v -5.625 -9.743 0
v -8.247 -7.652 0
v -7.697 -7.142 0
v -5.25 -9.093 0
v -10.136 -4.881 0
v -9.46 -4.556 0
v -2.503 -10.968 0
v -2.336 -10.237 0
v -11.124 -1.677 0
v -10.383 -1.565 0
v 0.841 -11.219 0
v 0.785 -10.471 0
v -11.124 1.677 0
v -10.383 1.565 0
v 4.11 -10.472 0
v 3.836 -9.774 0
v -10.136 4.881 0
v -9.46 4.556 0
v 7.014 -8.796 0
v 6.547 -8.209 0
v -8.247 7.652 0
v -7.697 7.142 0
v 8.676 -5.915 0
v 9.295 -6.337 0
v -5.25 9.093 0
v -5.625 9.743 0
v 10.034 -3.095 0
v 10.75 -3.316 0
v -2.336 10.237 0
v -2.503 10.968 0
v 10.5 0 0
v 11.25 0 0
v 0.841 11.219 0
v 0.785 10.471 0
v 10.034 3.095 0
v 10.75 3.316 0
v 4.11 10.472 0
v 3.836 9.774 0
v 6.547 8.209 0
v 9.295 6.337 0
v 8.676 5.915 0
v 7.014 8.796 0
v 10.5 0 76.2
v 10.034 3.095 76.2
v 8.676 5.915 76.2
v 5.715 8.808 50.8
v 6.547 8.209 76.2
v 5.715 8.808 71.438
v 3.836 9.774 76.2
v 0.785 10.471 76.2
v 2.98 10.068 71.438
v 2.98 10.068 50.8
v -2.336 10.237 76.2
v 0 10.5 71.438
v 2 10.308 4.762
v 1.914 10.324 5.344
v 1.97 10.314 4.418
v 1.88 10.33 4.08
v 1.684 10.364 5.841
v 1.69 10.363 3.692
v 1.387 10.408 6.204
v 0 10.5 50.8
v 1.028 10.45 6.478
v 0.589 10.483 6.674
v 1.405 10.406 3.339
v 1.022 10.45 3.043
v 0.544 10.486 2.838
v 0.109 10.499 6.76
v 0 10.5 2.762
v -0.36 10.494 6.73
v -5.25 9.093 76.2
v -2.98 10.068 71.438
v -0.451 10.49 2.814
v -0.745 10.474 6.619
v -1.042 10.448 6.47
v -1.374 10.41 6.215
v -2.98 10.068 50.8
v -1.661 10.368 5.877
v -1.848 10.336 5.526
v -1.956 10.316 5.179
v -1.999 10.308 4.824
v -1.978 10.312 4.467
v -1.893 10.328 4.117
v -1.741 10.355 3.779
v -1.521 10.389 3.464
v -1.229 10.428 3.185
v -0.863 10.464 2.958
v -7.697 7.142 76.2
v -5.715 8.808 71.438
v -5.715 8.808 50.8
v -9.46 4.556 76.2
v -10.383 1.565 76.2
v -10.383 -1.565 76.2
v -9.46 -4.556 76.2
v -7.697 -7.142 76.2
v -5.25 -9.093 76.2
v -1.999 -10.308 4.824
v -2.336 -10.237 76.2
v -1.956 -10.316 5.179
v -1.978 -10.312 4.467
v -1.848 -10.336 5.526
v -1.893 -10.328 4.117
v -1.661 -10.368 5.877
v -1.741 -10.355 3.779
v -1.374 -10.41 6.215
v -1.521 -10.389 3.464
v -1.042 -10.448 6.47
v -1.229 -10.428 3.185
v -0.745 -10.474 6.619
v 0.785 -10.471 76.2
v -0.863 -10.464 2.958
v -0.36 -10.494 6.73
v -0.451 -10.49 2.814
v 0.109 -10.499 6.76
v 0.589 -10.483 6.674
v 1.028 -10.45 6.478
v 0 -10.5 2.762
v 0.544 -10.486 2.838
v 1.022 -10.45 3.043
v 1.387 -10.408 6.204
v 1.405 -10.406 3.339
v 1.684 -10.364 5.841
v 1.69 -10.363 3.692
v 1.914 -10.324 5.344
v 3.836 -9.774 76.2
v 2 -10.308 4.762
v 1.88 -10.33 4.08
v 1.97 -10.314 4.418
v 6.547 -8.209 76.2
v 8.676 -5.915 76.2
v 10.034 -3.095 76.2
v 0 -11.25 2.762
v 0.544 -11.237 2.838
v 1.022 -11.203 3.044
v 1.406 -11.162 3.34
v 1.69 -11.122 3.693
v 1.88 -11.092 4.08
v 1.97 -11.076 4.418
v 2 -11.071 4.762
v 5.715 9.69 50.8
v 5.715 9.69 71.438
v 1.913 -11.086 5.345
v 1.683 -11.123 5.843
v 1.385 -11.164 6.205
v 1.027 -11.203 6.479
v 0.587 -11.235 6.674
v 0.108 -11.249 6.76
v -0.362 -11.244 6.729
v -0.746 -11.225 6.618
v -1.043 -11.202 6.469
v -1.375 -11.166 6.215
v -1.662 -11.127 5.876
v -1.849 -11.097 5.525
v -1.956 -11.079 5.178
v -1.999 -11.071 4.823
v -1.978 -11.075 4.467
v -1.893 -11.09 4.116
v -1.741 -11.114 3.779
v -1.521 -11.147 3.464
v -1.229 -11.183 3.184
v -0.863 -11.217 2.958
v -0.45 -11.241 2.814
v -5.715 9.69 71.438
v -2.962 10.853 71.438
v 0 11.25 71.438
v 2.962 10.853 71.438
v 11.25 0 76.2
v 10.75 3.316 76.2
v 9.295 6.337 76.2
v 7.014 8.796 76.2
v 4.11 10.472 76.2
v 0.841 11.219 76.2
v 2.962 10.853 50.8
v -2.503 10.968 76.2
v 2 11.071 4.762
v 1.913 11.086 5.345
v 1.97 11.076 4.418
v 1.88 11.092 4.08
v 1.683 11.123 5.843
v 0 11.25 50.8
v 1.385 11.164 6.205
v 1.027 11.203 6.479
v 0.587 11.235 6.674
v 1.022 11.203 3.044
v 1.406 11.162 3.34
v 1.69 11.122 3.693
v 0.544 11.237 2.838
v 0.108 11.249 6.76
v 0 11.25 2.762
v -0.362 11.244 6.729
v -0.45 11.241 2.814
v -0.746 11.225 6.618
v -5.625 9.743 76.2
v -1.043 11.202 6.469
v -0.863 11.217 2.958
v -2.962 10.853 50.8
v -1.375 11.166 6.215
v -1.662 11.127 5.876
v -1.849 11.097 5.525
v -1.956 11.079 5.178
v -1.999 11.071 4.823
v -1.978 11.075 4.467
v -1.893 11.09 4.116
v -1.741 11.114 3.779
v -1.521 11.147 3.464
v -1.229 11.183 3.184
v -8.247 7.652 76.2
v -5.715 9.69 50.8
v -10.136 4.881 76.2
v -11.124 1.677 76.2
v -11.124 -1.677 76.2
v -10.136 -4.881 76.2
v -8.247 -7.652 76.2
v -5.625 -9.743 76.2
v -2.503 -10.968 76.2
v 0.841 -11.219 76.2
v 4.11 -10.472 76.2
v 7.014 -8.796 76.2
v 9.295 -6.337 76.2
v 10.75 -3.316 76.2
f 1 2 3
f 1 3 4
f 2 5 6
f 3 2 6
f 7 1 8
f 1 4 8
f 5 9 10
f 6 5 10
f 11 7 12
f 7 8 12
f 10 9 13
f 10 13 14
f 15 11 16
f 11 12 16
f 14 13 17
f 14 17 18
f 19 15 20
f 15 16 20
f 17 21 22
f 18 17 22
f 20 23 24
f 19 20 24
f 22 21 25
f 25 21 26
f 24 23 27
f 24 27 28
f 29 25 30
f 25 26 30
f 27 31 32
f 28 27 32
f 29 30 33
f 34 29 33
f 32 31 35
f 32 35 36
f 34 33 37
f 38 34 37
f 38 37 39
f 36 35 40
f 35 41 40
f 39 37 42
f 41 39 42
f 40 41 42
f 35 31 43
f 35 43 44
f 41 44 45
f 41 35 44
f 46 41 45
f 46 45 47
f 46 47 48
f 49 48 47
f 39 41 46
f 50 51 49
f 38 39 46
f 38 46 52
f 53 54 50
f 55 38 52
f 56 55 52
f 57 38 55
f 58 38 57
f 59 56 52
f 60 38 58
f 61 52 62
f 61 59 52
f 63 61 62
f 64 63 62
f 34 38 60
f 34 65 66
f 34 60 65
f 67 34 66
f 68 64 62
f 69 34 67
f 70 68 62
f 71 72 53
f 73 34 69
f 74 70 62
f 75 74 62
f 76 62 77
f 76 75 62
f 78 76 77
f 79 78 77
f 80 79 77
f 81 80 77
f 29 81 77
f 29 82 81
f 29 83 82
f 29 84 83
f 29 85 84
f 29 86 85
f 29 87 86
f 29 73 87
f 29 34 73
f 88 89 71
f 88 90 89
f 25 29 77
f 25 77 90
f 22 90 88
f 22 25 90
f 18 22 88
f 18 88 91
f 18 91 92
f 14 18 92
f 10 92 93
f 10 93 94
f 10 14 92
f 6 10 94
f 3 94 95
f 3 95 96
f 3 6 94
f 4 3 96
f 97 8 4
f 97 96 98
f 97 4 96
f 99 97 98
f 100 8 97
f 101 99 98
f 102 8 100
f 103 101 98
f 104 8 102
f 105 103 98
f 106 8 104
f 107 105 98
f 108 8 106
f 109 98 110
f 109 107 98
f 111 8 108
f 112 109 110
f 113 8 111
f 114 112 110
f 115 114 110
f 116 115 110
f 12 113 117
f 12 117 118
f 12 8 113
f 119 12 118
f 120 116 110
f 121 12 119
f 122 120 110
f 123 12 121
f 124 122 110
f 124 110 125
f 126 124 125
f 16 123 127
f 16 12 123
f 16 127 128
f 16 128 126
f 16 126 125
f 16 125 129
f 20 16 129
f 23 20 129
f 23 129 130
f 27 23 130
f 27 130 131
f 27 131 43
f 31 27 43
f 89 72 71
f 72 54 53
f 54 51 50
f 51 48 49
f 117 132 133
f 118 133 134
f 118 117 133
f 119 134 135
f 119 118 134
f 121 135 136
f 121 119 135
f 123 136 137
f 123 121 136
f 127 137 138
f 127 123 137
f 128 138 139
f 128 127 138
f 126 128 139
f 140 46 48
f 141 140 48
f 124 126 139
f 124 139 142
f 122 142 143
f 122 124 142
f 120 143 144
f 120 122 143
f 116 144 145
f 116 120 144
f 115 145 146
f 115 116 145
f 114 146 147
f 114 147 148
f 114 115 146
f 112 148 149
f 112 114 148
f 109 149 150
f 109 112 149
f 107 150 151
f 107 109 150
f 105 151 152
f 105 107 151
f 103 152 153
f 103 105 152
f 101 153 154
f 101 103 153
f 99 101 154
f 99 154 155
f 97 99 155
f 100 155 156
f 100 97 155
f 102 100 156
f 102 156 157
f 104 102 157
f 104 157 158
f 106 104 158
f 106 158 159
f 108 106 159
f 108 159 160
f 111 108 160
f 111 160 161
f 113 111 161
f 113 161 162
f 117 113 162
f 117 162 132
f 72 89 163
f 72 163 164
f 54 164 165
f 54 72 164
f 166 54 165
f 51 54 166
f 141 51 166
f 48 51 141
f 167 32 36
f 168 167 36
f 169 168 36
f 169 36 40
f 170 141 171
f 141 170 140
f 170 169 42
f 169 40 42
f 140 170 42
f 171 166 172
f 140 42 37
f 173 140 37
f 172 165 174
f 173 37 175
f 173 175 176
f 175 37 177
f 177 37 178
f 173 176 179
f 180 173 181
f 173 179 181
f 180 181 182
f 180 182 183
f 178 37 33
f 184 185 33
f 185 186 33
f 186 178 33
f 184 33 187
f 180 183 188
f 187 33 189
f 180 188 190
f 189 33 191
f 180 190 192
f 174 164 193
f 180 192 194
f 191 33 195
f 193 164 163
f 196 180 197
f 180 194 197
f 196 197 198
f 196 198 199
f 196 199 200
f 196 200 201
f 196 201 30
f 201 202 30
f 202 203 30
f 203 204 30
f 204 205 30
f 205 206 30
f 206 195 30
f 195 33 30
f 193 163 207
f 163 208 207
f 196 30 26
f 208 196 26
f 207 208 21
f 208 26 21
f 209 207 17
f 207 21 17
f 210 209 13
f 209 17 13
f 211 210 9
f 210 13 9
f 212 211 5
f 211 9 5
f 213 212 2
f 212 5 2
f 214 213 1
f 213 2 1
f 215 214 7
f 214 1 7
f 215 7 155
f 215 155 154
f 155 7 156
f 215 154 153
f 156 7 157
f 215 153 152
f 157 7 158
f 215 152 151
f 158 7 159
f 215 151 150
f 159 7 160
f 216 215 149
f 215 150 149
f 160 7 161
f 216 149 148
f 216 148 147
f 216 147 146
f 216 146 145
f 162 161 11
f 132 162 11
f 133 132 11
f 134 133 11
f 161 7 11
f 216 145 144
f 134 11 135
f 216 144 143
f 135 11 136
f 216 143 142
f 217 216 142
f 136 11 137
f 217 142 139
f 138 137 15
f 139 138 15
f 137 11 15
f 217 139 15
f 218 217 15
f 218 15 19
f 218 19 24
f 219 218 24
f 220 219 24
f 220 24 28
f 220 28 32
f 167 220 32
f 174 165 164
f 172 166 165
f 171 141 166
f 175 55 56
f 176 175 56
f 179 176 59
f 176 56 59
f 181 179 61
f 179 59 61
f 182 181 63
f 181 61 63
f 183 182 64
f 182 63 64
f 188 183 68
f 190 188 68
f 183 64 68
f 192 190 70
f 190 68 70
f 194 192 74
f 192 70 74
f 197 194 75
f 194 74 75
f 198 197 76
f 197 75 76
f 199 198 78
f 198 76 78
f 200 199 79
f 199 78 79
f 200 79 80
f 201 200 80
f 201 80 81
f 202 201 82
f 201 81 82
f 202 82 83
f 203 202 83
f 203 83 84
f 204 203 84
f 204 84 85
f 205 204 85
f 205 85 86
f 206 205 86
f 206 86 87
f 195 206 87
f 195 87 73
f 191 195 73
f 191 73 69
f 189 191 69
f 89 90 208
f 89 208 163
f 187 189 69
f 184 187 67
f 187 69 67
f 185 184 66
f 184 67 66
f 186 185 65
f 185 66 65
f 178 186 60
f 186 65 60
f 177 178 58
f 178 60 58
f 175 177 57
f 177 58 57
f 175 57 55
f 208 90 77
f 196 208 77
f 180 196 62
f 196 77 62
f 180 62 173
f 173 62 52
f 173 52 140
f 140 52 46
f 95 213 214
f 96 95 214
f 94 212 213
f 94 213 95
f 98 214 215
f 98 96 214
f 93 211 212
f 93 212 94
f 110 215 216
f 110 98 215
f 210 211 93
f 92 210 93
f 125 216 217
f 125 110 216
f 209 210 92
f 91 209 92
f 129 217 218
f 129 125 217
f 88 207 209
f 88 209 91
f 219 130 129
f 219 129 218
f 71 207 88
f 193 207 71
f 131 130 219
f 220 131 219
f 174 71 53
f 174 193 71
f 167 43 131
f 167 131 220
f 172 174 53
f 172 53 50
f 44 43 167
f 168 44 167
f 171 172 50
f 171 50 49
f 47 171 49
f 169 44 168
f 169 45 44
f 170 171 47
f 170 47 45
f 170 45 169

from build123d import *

# Parameters (mm, degrees)
F0_R          = 11.25
F0_R_2        = 10.5
F1_DEPTH      = 76.2
F2_W          = 11.43
F2_H          = 20.6375
F3_DEPTH      = 25.4
F5_DEPTH      = 25.4
F5_DEPTH_BACK = 25.4


with BuildPart() as f1:
    # F0 (on Top) → F1 (new body)
    with BuildSketch(Plane.XY):
        Circle(F0_R)
        Circle(F0_R_2, mode=Mode.SUBTRACT)
    extrude(amount=F1_DEPTH)

    # F2 (on Front) → F3 (cut)
    with BuildSketch(Plane.XZ):
        with Locations((0, 61.11875)):
            Rectangle(F2_W, F2_H)
    extrude(amount=-F3_DEPTH, mode=Mode.SUBTRACT)

    # F4 (on Front) → F5 (cut, two sides)
    with BuildSketch(Plane.XZ) as f5_sk:
        with BuildLine():
            ThreePointArc((0, 2.7625), (1.4142135624, 3.3482864376), (2, 4.7625))
            ThreePointArc((2, 4.7625), (-1.4142135624, 6.1767135624), (0, 2.7625))
        make_face()
    extrude(amount=-F5_DEPTH, mode=Mode.SUBTRACT)
    extrude(f5_sk.sketch, amount=F5_DEPTH_BACK, mode=Mode.SUBTRACT)


solid = f1.part
